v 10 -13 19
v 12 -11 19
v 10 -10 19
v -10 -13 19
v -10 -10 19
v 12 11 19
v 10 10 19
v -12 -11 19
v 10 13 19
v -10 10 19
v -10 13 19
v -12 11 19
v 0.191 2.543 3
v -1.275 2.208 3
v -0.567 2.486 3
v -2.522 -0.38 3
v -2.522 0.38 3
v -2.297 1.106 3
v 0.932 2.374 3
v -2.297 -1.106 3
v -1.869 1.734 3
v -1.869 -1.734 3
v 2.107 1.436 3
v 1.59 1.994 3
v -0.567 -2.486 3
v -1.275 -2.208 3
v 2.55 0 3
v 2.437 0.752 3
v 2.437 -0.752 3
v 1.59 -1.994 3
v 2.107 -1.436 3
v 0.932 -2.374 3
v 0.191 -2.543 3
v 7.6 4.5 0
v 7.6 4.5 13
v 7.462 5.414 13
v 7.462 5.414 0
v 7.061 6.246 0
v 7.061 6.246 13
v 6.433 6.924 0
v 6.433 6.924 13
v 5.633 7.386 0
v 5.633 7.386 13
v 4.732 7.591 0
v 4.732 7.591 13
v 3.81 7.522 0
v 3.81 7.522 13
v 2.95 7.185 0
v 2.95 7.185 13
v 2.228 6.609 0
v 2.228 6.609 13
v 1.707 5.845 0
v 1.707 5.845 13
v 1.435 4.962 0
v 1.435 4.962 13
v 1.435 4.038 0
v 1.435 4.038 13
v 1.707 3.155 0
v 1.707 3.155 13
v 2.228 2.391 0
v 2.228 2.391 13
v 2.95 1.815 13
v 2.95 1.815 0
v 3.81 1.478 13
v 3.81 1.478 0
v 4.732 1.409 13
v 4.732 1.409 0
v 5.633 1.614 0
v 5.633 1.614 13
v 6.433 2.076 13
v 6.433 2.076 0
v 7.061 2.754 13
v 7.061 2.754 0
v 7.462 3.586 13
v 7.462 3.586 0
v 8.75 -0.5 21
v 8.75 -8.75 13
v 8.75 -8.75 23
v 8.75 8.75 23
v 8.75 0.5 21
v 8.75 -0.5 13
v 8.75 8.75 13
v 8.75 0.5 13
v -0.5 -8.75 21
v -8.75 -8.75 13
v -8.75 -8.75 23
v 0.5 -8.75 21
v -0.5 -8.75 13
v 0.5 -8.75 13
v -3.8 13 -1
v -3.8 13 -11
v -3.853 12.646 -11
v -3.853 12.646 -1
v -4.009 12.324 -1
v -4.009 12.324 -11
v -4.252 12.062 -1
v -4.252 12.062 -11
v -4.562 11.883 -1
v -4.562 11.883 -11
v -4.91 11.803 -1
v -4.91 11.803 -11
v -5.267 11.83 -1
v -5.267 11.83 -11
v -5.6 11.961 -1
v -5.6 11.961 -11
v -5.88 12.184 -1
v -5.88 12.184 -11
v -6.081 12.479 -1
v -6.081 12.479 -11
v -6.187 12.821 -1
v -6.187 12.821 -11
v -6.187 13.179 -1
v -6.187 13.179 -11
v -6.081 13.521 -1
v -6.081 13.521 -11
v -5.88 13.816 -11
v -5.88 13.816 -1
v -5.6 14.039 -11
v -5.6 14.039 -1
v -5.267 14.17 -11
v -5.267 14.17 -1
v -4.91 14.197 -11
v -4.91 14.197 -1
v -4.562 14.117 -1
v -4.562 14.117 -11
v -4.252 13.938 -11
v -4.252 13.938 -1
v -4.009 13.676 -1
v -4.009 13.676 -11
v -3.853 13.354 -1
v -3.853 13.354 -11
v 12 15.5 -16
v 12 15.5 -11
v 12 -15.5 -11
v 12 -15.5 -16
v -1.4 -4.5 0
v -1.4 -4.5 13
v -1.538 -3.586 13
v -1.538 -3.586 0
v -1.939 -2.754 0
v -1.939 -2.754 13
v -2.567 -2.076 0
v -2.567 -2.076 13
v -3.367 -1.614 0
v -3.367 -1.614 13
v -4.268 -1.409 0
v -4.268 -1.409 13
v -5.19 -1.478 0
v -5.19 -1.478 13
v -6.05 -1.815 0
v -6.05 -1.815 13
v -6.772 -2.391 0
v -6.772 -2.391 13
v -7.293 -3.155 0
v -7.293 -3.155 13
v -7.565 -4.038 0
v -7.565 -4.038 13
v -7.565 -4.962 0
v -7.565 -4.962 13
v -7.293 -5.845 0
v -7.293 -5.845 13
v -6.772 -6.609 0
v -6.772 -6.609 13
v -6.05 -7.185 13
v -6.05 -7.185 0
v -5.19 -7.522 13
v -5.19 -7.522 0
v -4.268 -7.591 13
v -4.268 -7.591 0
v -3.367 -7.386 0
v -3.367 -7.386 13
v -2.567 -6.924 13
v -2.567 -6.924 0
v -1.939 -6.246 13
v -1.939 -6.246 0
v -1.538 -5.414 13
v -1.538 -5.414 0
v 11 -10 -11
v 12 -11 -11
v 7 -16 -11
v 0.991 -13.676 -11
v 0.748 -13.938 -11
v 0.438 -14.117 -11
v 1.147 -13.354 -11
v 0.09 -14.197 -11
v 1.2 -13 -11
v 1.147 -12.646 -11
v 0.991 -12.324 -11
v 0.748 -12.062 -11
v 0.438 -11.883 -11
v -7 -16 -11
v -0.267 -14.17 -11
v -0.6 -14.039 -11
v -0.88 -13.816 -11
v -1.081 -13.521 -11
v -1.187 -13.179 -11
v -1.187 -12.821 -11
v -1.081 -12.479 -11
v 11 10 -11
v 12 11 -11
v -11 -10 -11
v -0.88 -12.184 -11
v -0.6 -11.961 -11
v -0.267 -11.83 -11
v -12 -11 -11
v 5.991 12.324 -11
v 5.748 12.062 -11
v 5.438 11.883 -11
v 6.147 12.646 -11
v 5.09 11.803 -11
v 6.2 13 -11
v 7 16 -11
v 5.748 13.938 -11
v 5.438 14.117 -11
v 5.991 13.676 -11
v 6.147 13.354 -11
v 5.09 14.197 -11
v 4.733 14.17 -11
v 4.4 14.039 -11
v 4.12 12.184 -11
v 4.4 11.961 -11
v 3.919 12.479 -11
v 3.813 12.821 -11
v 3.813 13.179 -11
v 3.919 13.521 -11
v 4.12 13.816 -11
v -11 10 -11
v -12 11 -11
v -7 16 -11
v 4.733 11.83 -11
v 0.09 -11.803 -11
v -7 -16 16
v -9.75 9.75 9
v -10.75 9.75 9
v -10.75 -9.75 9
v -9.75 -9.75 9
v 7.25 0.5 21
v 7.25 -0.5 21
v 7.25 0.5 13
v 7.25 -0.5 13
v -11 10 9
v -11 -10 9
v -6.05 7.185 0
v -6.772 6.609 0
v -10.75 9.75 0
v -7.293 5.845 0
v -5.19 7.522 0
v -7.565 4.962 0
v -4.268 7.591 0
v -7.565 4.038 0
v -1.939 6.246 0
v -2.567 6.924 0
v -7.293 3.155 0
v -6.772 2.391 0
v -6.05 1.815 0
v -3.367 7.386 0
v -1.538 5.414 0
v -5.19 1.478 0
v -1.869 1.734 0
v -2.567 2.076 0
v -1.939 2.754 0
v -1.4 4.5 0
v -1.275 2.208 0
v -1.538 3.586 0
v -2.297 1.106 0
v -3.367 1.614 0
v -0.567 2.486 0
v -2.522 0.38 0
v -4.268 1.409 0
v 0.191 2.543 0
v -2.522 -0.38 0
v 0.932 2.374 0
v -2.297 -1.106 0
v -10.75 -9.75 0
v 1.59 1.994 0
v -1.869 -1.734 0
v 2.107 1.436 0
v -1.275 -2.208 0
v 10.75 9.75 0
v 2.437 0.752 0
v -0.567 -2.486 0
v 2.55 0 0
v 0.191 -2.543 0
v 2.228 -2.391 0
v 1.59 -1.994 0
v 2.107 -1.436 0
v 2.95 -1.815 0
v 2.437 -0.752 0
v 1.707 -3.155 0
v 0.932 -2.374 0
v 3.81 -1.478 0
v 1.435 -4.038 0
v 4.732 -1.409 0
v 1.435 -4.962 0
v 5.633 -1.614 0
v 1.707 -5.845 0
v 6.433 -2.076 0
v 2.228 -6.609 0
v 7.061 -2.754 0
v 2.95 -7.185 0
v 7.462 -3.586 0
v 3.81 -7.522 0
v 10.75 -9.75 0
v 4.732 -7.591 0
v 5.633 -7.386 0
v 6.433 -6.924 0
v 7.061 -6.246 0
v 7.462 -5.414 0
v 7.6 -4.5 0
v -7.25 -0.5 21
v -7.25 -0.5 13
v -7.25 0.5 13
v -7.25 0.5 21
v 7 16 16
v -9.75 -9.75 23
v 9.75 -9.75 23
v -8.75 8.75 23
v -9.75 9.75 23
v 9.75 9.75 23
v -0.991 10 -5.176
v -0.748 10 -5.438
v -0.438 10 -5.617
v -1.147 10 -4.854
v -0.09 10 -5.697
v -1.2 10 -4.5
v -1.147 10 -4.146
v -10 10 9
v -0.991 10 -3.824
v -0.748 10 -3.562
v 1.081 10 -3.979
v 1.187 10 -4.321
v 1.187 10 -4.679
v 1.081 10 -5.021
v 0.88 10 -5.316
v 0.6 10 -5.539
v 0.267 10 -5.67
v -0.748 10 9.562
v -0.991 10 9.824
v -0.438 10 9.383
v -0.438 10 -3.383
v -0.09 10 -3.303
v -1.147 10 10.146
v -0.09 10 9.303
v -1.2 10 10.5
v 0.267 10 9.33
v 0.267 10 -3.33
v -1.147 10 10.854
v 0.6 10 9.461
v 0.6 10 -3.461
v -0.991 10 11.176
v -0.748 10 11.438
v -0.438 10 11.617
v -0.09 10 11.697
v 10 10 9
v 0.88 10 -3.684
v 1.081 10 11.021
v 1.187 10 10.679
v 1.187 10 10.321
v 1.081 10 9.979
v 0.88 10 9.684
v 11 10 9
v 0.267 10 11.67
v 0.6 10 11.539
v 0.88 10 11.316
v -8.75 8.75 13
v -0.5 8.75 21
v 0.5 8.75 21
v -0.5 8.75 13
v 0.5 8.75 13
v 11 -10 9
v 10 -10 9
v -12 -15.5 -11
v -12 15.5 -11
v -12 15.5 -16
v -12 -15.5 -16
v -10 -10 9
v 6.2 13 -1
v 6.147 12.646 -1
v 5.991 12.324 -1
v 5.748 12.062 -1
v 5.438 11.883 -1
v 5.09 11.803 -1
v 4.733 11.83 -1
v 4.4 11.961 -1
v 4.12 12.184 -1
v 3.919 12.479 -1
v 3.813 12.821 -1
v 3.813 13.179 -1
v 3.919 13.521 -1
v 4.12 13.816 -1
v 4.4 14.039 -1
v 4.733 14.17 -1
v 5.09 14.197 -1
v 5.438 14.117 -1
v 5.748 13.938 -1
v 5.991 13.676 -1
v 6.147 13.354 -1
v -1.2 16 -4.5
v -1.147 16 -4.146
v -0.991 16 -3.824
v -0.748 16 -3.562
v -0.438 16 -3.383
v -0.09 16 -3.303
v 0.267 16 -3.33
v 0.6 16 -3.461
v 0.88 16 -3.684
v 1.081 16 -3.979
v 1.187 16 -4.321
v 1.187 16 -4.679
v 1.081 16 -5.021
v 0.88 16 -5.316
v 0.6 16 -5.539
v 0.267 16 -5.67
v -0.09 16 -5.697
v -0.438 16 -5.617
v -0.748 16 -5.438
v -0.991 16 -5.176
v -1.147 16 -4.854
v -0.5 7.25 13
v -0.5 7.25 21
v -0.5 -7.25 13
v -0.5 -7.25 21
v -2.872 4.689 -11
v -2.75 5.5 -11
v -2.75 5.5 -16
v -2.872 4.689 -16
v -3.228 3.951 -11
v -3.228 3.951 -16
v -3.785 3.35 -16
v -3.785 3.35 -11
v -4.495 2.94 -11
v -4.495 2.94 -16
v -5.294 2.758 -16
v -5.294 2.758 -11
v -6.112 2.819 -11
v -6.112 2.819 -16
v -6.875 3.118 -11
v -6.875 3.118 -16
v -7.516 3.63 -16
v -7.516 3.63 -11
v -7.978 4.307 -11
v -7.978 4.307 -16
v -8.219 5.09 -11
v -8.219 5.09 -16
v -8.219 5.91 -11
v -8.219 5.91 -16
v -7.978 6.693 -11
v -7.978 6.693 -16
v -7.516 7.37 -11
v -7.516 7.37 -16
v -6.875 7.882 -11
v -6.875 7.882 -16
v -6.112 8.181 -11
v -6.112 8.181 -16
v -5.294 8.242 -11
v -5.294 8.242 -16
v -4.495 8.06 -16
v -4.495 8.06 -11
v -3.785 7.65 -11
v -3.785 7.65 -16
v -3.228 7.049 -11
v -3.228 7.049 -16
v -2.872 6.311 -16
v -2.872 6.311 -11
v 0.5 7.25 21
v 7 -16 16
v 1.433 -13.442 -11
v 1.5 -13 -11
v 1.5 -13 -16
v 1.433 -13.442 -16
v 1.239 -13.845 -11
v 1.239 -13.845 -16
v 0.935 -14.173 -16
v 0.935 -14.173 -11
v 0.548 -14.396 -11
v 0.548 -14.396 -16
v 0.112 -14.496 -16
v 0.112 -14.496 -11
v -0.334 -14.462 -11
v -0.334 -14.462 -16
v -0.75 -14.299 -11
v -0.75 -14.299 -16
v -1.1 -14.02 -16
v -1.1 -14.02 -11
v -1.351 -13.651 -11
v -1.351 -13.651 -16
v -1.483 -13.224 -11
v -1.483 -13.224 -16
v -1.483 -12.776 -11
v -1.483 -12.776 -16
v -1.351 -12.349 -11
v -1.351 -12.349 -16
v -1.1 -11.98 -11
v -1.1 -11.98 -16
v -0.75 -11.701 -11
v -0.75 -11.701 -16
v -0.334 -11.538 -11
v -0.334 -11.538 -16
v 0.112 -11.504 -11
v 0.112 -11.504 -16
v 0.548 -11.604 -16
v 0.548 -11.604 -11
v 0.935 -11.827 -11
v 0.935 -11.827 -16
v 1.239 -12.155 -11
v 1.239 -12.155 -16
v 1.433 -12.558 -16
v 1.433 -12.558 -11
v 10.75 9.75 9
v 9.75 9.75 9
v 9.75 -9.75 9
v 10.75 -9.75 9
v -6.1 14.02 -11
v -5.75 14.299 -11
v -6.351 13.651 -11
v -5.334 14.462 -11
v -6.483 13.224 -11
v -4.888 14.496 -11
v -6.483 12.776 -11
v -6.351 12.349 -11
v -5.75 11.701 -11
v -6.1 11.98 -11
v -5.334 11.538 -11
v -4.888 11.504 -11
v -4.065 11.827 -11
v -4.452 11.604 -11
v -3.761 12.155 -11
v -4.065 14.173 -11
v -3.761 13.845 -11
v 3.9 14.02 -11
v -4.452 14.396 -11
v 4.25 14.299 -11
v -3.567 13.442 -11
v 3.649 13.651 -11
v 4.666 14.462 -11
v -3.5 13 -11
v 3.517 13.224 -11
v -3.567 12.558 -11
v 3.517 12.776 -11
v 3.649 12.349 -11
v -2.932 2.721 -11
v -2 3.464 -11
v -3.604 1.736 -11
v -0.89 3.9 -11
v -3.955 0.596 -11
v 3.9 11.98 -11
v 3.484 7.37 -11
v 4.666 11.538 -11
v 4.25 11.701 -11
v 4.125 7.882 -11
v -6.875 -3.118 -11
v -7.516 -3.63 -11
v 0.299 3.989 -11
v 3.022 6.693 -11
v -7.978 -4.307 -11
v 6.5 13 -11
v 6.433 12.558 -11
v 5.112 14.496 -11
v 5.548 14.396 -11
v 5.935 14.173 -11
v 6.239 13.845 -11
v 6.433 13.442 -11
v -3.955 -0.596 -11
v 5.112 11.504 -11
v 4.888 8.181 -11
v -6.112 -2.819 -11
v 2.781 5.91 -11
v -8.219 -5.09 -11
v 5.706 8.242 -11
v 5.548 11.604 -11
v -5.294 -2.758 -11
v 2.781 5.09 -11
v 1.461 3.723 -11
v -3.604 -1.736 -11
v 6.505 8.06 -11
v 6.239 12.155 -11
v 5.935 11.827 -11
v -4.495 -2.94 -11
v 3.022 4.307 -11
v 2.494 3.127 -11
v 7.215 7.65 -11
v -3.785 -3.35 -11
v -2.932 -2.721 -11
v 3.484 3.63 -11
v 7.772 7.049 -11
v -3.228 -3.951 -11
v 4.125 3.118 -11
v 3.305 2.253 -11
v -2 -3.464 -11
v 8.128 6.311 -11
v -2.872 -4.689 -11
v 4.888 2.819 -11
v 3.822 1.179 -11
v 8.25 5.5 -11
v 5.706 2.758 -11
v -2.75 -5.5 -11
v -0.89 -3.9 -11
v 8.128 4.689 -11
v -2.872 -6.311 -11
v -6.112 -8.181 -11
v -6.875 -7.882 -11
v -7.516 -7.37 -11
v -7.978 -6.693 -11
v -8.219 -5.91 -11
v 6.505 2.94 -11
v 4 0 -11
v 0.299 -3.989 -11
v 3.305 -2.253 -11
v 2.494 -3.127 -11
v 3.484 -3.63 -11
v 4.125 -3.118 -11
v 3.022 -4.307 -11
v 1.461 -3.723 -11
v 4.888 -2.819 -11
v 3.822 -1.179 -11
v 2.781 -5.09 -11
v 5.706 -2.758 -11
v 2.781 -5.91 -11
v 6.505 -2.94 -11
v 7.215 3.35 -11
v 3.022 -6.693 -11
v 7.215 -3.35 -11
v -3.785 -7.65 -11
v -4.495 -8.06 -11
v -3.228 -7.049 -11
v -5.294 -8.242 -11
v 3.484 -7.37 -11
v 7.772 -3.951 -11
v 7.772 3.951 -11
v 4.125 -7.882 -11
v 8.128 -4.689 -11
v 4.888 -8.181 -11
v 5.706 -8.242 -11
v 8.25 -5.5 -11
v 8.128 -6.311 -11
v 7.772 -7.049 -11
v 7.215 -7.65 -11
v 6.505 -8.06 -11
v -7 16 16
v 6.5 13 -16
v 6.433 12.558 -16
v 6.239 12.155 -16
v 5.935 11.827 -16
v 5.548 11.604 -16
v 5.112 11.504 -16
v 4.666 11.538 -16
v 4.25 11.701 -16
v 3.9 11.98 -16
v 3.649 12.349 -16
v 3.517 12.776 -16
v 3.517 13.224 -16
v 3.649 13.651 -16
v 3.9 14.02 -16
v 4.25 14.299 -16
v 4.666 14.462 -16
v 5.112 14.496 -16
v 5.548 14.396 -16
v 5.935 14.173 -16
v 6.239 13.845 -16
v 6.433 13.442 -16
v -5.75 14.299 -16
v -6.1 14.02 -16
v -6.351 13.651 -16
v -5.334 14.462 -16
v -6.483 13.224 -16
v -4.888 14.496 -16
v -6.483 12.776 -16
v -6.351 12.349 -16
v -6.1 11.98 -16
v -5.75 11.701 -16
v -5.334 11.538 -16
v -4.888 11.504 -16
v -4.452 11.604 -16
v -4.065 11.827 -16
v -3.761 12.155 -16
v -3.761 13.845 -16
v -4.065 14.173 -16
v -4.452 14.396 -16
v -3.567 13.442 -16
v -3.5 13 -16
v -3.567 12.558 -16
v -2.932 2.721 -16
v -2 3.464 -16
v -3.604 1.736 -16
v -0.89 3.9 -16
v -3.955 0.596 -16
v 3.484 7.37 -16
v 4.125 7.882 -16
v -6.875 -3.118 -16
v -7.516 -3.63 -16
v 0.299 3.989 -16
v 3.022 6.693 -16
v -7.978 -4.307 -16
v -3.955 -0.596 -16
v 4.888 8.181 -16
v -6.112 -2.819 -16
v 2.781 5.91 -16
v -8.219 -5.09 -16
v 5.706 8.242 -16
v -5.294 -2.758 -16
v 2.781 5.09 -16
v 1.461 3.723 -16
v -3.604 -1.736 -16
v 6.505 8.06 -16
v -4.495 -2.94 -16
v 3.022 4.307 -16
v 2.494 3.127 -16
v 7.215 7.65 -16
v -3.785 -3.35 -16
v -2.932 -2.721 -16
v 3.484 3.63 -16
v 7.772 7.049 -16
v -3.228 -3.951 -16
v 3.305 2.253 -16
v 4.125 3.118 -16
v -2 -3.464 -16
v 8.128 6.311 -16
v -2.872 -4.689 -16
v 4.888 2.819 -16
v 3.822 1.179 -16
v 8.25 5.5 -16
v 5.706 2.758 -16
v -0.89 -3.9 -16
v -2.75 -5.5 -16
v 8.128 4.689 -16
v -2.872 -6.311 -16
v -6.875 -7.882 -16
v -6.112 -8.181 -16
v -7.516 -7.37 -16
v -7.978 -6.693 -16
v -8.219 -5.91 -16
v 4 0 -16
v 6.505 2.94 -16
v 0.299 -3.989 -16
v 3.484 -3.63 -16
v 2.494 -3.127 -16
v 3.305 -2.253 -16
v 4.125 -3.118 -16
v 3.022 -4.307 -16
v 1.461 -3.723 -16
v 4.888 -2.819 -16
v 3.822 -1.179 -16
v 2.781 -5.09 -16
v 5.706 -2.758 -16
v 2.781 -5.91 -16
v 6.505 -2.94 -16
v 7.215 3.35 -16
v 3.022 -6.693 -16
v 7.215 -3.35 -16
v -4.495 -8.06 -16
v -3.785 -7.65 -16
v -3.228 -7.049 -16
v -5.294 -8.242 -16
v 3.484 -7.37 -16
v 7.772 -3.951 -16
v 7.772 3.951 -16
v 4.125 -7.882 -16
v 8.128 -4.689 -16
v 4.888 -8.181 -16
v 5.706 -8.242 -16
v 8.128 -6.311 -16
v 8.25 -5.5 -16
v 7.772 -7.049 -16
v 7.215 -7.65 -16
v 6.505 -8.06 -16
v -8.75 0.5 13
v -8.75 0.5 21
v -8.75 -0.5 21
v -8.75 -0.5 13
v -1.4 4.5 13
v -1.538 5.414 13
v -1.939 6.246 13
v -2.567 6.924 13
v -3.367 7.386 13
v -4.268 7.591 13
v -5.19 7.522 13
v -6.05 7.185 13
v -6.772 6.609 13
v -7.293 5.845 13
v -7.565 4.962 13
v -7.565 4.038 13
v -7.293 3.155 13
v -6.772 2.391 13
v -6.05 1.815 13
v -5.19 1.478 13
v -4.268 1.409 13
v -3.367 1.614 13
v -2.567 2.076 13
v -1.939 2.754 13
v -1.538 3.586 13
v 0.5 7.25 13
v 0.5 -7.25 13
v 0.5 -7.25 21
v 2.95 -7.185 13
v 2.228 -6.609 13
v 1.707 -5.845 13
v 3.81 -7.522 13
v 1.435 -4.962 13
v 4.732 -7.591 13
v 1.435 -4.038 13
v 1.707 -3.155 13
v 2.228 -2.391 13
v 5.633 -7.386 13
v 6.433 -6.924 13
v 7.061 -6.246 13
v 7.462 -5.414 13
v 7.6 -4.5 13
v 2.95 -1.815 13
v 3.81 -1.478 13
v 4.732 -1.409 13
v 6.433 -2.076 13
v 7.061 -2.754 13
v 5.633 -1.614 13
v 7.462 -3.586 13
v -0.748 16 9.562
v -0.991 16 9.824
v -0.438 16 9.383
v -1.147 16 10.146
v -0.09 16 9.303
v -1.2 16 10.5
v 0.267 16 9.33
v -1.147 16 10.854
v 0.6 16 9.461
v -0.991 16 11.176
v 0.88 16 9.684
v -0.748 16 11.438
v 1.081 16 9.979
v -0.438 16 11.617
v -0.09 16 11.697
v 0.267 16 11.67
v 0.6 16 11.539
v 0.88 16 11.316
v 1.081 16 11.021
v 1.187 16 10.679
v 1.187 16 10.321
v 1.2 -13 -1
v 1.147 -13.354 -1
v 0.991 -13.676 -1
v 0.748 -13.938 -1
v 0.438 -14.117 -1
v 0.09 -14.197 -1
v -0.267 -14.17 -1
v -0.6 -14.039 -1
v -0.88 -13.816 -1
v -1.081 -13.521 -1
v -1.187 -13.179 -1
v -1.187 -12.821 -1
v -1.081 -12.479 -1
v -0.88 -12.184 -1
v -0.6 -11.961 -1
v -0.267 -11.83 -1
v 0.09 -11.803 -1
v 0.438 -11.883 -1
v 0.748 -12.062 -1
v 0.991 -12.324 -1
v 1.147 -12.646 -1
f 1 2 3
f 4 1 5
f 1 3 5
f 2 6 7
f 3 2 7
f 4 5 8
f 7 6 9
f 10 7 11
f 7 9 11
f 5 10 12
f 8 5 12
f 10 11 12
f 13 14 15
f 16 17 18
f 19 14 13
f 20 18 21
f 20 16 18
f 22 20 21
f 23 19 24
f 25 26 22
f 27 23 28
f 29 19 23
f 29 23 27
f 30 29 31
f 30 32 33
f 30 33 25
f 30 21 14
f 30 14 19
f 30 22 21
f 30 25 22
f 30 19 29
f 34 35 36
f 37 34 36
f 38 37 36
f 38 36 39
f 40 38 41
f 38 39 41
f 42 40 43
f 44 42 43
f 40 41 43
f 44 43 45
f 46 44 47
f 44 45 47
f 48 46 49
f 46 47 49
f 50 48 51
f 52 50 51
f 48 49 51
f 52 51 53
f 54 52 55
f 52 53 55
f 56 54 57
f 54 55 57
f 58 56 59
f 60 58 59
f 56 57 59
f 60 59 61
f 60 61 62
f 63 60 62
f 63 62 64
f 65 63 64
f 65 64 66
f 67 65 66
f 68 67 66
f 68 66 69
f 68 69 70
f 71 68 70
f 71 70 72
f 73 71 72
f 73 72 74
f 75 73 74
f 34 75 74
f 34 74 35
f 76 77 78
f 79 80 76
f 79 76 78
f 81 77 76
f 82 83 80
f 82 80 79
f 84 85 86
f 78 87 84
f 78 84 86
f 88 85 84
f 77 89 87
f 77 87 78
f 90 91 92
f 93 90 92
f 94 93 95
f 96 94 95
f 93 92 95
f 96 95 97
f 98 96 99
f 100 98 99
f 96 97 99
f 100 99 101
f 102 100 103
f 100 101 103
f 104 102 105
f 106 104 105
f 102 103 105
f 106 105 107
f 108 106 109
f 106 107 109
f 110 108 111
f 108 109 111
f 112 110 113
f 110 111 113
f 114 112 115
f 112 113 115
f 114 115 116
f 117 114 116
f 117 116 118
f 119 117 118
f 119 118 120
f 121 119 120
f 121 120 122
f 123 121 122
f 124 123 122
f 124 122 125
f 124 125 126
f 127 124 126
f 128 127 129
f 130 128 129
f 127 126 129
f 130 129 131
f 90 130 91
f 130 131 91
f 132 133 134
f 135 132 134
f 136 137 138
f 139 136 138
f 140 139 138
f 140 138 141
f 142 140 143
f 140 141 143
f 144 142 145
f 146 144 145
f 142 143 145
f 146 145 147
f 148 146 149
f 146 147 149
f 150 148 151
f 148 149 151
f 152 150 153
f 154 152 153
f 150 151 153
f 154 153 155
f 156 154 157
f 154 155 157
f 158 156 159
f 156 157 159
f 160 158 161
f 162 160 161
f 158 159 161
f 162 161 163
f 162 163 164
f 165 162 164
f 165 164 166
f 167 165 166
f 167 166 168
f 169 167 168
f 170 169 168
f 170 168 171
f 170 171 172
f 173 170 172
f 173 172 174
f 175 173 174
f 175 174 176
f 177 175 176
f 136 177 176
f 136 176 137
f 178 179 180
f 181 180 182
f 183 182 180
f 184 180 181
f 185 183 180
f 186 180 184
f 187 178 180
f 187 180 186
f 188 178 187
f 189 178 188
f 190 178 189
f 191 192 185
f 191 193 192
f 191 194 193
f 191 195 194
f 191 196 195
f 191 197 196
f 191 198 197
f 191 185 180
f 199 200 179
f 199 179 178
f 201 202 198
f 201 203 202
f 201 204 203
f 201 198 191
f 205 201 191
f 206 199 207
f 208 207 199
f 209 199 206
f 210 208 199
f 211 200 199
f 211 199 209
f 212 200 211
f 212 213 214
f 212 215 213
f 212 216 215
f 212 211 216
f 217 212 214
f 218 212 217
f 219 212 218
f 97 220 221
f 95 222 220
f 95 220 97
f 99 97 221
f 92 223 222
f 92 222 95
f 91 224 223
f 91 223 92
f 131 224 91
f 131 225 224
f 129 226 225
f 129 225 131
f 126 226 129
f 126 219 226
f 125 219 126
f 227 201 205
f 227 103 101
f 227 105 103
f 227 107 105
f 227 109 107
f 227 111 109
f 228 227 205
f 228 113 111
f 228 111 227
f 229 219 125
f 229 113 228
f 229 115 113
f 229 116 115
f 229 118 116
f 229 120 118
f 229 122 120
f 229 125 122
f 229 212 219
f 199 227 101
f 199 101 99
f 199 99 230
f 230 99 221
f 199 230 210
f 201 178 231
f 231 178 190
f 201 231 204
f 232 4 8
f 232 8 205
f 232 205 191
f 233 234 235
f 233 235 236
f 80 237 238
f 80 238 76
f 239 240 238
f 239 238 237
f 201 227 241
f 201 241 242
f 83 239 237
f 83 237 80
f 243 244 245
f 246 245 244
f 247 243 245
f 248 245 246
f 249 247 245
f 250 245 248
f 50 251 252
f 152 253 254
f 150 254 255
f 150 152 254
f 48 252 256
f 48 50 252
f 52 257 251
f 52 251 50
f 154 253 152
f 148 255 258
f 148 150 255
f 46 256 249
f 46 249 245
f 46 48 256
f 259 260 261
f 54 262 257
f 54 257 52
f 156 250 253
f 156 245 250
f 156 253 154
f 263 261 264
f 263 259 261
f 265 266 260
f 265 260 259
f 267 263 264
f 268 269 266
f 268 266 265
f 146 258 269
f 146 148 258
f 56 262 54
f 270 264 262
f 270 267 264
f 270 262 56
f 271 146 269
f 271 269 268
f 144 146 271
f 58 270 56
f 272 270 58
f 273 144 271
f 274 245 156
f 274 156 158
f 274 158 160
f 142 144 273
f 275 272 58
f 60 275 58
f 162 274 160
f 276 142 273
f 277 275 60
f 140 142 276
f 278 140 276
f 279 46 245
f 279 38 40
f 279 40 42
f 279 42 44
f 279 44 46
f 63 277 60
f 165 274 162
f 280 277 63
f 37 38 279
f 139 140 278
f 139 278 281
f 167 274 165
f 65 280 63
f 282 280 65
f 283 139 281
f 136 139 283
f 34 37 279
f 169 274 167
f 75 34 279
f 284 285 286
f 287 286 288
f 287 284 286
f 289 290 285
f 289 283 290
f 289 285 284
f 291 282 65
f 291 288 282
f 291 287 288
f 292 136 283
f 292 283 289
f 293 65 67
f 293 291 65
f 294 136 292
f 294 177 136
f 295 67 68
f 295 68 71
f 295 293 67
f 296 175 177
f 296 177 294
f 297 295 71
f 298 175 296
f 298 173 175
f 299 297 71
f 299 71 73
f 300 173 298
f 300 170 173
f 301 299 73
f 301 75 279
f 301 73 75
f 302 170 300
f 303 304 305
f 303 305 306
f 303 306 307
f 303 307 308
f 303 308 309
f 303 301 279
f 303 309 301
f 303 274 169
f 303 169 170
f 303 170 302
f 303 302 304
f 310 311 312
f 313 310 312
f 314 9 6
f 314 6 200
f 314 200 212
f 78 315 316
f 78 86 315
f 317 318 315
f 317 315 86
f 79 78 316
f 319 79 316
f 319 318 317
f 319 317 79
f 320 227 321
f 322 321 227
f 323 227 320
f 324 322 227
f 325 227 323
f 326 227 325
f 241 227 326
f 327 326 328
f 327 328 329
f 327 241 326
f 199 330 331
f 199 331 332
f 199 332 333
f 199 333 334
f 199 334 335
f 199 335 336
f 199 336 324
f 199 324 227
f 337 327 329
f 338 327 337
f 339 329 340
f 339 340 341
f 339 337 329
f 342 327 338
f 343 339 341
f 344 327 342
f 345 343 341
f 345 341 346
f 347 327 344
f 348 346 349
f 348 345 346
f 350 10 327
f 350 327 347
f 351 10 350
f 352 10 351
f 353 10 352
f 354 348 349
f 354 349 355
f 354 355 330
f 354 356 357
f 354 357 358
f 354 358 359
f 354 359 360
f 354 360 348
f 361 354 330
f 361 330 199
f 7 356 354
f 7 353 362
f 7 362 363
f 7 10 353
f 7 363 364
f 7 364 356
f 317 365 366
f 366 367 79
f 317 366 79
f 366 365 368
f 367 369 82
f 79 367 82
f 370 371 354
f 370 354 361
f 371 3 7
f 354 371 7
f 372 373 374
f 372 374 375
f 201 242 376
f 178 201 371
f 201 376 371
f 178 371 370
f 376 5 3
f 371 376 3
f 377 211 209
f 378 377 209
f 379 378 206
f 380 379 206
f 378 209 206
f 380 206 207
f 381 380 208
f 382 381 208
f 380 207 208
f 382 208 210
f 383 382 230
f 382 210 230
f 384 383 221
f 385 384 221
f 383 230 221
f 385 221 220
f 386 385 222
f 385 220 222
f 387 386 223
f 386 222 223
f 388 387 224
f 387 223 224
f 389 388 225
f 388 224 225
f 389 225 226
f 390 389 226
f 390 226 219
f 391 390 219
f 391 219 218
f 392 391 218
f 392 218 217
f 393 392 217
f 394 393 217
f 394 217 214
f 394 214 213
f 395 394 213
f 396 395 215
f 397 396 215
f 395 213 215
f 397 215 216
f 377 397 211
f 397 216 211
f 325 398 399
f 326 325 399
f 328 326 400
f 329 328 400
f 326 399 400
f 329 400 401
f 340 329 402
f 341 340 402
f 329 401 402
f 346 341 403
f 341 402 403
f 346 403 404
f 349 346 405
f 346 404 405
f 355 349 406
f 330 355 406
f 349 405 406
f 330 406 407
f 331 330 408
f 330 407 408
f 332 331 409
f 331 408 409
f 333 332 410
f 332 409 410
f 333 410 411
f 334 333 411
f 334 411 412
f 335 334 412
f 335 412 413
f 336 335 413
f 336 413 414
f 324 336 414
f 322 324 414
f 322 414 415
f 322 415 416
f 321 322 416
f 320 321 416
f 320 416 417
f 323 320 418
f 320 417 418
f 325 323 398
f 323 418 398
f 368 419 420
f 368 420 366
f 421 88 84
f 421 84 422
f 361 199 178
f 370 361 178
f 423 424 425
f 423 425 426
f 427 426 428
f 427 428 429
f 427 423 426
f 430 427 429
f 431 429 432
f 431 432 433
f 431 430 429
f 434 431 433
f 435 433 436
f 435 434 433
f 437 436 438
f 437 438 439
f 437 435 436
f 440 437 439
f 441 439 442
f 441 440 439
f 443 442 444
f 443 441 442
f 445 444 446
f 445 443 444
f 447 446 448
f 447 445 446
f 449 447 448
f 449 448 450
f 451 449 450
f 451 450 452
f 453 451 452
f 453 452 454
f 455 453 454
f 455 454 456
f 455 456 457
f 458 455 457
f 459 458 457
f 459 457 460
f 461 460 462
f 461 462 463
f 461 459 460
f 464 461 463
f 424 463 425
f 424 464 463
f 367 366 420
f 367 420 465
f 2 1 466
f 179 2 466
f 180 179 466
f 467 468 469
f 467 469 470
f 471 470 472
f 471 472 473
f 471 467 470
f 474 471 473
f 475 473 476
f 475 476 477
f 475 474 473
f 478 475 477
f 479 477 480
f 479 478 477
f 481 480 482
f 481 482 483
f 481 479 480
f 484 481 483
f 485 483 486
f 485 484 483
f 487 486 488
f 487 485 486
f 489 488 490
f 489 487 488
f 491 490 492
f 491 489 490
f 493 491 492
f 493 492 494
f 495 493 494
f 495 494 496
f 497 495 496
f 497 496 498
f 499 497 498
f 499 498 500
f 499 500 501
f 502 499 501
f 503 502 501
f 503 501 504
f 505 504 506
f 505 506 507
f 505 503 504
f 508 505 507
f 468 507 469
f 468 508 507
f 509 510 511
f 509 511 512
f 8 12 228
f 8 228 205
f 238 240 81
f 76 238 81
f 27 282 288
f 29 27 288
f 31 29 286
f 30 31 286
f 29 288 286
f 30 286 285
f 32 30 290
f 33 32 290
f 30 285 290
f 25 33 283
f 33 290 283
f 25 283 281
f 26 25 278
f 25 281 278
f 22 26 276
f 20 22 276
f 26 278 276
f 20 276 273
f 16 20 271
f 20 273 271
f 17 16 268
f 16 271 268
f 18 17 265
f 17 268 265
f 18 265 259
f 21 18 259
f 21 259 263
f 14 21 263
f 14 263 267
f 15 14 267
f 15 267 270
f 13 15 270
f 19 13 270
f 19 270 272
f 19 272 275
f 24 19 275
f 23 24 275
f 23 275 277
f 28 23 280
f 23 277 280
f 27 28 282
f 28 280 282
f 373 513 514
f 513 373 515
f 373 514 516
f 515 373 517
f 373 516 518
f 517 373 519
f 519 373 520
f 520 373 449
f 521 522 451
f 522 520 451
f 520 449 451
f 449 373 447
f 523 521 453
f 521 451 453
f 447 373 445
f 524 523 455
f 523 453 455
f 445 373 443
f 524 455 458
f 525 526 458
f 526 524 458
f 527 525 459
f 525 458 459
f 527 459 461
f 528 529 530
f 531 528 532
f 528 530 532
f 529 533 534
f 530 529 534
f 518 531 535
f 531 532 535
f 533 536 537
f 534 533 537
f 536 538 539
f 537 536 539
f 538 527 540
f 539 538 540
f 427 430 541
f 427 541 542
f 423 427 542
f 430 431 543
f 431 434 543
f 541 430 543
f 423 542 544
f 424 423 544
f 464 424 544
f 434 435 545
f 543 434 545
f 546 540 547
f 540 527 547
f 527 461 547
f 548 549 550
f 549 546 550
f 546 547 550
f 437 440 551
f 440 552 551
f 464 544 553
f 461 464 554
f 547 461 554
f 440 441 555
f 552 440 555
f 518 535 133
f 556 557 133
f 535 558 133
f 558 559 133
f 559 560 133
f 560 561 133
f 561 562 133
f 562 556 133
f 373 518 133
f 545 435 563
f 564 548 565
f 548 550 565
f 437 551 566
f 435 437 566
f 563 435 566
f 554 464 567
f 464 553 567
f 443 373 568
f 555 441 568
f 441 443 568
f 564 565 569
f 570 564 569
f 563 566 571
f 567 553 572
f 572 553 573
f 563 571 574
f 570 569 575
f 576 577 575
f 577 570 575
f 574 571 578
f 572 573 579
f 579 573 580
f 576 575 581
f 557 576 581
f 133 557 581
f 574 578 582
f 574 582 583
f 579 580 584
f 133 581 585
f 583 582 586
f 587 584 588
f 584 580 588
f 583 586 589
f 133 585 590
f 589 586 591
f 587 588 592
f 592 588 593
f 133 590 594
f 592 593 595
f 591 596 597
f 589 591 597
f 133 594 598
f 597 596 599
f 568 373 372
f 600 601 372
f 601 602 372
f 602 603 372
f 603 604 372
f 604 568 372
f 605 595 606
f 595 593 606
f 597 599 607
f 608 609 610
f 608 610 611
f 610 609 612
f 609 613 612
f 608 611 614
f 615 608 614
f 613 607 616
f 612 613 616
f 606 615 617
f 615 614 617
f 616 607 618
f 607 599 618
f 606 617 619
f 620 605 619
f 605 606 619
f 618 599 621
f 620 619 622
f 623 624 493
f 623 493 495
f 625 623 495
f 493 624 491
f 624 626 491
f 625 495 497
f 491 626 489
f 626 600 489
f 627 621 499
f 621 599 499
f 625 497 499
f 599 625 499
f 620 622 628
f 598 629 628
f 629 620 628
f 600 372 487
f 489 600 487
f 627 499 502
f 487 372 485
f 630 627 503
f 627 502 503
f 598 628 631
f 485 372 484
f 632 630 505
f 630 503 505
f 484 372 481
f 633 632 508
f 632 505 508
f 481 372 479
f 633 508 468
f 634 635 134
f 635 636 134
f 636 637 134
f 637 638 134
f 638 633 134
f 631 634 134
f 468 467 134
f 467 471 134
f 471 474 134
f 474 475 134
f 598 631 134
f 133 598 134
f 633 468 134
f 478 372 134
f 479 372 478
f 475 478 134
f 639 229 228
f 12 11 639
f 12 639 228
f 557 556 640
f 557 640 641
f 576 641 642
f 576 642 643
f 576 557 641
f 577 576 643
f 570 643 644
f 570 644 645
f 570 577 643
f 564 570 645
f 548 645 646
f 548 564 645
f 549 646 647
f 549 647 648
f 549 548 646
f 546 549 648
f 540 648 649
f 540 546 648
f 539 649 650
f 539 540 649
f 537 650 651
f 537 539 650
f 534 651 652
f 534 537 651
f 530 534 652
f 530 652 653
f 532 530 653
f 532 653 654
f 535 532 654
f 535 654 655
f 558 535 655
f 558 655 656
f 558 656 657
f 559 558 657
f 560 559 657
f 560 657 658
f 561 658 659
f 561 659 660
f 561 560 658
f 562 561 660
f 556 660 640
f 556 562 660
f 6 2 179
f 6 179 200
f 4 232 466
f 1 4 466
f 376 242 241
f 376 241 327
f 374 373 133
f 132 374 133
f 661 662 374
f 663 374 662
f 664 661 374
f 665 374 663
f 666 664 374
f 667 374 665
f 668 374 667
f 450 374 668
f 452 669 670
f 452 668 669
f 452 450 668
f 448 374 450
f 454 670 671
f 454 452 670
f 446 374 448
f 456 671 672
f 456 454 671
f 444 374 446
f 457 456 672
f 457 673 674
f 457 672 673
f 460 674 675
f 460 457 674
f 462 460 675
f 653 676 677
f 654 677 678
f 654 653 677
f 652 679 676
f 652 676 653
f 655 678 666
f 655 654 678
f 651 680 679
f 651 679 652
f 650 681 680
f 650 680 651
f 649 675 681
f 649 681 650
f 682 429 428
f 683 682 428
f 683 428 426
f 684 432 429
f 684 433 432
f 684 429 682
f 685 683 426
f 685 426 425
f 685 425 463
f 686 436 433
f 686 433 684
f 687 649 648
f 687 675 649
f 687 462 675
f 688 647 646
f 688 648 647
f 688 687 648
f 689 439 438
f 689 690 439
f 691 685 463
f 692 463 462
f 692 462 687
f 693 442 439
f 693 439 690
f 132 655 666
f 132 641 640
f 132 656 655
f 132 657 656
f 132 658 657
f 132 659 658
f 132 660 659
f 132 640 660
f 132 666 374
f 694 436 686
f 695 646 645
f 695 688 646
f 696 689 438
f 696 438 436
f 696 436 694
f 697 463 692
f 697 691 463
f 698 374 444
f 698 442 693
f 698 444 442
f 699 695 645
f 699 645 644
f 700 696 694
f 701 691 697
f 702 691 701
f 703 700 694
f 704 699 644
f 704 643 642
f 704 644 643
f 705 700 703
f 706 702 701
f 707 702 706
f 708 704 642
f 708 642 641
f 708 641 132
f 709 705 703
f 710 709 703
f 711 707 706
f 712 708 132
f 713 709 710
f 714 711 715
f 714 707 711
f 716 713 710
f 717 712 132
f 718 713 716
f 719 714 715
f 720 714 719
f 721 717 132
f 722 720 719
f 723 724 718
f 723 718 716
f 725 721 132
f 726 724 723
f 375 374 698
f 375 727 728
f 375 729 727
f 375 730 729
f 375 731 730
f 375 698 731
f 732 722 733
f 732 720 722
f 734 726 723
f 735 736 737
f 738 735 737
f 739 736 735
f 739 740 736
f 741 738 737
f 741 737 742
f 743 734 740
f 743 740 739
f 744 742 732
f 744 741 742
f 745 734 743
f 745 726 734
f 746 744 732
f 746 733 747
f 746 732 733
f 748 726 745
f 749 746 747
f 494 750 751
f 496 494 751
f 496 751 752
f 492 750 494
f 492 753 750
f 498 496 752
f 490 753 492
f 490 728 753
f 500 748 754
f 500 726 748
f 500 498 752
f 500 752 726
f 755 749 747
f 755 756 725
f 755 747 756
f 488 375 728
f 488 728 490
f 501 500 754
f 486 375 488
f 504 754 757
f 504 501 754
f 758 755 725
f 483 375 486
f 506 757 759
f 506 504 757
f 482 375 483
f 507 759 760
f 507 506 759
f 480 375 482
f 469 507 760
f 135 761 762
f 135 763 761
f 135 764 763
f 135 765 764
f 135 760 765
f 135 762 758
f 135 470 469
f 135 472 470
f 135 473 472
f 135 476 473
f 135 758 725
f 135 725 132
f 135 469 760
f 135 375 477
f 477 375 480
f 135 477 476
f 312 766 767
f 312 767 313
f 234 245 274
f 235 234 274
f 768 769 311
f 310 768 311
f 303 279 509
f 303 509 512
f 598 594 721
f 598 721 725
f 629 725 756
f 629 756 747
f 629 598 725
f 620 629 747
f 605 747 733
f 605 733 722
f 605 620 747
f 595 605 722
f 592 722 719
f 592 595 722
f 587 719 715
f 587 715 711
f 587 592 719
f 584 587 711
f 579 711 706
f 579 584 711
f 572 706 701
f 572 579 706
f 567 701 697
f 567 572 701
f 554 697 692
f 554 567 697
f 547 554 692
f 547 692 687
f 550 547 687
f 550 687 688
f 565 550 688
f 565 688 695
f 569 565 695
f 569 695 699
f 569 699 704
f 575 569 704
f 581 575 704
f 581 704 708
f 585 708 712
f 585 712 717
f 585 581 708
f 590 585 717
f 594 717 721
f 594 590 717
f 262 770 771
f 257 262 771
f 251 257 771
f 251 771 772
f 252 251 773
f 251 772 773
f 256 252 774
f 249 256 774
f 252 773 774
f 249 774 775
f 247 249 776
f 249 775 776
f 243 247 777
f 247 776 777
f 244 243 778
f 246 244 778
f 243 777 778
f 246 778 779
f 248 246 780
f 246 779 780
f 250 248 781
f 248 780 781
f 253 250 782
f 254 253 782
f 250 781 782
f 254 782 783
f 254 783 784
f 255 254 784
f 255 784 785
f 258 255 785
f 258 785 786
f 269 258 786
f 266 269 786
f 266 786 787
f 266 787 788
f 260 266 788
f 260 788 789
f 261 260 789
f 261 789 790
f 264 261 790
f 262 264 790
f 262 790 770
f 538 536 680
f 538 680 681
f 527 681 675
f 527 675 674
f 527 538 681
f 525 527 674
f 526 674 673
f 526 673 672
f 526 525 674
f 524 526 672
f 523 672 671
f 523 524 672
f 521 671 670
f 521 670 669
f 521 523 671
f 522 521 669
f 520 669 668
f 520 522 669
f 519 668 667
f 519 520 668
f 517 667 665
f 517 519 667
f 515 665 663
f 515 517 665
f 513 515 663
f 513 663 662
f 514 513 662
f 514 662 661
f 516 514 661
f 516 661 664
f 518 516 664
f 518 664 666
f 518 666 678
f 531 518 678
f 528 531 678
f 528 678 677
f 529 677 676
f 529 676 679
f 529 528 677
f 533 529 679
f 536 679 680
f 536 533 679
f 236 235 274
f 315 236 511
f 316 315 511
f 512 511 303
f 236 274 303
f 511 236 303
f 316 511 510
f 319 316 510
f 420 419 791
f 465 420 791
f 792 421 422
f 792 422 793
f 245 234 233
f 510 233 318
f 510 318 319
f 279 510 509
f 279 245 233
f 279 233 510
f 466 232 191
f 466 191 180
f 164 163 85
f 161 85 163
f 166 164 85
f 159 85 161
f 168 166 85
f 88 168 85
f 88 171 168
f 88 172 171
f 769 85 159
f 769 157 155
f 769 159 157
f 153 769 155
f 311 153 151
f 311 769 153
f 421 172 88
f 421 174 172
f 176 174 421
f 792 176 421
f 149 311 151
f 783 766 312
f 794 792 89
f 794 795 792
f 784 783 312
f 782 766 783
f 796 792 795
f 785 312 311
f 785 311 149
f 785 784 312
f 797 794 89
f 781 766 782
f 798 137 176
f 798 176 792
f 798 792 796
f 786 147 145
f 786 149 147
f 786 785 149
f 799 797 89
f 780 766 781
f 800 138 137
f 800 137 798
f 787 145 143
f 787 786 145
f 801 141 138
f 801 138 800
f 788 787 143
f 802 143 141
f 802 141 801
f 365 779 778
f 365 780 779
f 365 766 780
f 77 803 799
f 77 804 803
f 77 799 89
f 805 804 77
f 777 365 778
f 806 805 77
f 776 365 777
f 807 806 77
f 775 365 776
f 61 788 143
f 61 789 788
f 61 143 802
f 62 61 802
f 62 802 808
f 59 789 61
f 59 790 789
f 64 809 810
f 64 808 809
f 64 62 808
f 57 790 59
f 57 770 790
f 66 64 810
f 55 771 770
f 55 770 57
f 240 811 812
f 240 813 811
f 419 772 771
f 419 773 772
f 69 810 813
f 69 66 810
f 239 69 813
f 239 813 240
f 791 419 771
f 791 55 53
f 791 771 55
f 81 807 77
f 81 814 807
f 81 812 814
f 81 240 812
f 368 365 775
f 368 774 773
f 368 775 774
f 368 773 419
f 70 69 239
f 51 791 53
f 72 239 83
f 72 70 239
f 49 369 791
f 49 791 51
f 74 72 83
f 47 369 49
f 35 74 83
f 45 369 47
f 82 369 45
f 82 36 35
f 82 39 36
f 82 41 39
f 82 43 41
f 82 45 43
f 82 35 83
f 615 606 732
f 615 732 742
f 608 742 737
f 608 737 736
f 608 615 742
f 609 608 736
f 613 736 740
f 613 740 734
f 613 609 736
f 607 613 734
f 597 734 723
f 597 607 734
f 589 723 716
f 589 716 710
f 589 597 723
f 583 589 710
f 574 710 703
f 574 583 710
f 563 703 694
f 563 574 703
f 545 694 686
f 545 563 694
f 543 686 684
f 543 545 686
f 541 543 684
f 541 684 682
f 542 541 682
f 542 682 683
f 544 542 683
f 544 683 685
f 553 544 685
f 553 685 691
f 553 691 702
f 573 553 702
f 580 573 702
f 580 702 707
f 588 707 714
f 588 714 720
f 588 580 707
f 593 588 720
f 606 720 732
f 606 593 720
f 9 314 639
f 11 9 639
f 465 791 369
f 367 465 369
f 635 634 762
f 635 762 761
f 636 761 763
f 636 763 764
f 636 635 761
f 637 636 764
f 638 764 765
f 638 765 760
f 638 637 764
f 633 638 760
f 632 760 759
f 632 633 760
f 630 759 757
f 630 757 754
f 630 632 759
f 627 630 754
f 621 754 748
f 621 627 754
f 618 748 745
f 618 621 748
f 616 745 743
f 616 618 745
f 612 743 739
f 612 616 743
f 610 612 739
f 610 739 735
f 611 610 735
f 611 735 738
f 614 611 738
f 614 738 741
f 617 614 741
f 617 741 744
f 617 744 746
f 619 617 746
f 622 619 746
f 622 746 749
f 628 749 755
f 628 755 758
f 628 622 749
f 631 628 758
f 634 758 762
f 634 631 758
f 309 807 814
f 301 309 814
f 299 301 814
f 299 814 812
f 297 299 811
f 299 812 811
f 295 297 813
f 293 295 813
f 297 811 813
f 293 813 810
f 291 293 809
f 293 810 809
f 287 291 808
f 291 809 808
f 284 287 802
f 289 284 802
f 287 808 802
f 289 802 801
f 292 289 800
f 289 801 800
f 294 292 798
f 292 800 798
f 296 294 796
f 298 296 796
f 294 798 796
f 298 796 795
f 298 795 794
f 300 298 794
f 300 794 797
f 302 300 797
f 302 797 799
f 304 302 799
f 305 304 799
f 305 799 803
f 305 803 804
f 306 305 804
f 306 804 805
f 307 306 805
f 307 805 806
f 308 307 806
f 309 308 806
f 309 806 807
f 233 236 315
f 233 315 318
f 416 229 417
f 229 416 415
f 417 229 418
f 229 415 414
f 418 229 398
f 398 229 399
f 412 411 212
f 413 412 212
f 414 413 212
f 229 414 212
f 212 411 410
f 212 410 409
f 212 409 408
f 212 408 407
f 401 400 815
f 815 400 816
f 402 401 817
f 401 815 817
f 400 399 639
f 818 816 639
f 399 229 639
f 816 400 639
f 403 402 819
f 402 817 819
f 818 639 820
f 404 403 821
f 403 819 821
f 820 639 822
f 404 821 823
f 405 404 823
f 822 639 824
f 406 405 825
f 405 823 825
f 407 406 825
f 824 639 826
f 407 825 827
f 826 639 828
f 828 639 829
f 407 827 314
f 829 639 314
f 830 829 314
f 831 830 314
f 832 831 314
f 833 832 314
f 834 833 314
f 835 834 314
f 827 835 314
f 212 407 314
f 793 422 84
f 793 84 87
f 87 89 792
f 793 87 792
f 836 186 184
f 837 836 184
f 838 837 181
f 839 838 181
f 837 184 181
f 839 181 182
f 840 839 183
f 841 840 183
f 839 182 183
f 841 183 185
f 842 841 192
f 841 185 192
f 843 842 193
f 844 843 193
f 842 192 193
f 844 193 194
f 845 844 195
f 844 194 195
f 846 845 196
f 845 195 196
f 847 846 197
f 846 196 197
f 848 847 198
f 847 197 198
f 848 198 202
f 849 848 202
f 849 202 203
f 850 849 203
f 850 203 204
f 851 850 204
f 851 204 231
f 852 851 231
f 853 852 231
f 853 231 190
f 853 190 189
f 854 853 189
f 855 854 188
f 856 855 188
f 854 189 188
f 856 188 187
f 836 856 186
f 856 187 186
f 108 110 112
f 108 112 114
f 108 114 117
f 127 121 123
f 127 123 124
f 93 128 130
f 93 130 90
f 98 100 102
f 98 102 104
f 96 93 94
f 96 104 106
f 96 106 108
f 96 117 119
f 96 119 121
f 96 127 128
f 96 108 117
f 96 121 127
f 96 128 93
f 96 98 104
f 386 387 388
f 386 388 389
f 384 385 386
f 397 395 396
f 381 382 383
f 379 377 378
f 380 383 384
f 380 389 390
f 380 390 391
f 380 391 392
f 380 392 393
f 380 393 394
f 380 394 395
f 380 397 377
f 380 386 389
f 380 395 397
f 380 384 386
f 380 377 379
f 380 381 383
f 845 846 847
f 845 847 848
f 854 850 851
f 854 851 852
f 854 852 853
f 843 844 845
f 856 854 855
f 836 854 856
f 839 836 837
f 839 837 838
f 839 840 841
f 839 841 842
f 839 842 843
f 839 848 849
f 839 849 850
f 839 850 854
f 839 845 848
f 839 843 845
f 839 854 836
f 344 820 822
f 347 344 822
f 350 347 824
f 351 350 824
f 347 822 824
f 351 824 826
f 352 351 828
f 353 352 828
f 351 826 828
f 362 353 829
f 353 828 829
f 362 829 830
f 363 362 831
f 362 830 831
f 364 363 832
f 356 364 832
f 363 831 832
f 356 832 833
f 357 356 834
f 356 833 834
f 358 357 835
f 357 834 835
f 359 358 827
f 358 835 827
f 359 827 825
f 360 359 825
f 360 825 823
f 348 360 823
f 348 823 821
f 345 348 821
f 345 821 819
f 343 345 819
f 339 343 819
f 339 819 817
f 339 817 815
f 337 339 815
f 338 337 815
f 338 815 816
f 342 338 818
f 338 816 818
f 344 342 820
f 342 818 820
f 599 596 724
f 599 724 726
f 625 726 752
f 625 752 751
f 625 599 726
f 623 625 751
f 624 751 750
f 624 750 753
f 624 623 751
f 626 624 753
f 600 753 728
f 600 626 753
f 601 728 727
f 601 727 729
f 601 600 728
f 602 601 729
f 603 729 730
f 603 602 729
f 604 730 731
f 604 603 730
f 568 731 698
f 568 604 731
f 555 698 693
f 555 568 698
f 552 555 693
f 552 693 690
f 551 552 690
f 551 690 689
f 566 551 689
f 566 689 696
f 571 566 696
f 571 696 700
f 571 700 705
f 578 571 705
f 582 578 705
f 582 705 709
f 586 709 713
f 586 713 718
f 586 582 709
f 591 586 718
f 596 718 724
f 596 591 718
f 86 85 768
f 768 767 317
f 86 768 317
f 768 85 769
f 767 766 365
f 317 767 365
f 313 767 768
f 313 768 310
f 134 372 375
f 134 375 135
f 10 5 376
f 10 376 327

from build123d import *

# Parameters (mm, degrees)
F0_W          = 19.5
F0_H          = 19.5
F1_DEPTH      = 13
F2_W          = 19.5
F2_H          = 19.5
F2_W_2        = 17.5
F2_H_2        = 17.5
F3_DEPTH      = 10
F4_W          = 1
F4_H          = 1.5
F4_W_2        = 1.5
F4_H_2        = 1
F5_DEPTH      = 8
F6_R          = 3.1
F7_DEPTH      = 19
F8_W          = 1
F8_H          = 19.5
F9_DEPTH      = 9
F10_R         = 2.55
F11_DEPTH     = 3
F13_W         = 20
F13_H         = 20
F13_W_2       = 10
F13_H_2       = 5
F14_DEPTH     = 30
F15_W         = 22
F15_H         = 20
F16_DEPTH     = 20
F17_R         = 1.2
F18_DEPTH     = 6
F19_T4_DEPTH  = 30
F19_T10_DEPTH = 30
F19_T16_DEPTH = 30
F19_T22_DEPTH = 30
F20_R         = 1.2
F21_DEPTH     = 10
F23_W         = 24
F23_H         = 31
F23_R         = 1.5
F23_R_2       = 2.75
F23_R_3       = 4
F24_DEPTH     = 5
F25_SIZE      = 3


# Not quite as in the source:
# - a fillet or chamfer that OpenCascade refuses, or shapes differently, is made with other operations: its cross-section is extruded or revolved along the edge and cut away or added


with BuildPart() as f1:
    # F0 (on Top) → F1 (new body)
    with BuildSketch(Plane.XY):
        Rectangle(F0_W, F0_H)
    extrude(amount=F1_DEPTH)

    # F2 (on face) → F3 (join)
    with BuildSketch(Plane.XY.offset(13)):
        Rectangle(F2_W, F2_H)
        Rectangle(F2_W_2, F2_H_2, mode=Mode.SUBTRACT)
    extrude(amount=F3_DEPTH)

    # F4 (on face) → F5 (join)
    with BuildSketch(Plane.XY.offset(13)):
        with Locations((0, 8)):
            Rectangle(F4_W, F4_H)
        with Locations((0, -8)):
            Rectangle(F4_W, F4_H)
        with Locations((-8, 0)):
            Rectangle(F4_W_2, F4_H_2)
        with Locations((8, 0)):
            Rectangle(F4_W_2, F4_H_2)
    extrude(amount=F5_DEPTH)

    # F6 (on face) → F7 (cut)
    with BuildSketch(Plane.XY.offset(13)):
        with Locations((-4.5, 4.5)):
            Circle(F6_R)
        with Locations((-4.5, -4.5)):
            Circle(F6_R)
        with Locations((4.5, 4.5)):
            Circle(F6_R)
        with Locations((4.5, -4.5)):
            Circle(F6_R)
    extrude(amount=-F7_DEPTH, mode=Mode.SUBTRACT)

    # F8 (on face) → F9 (join)
    with BuildSketch(Plane(origin=(0, 0, 0), x_dir=(1, 0, 0), z_dir=(0, 0, -1))):
        with Locations((-10.25, 0)):
            Rectangle(F8_W, F8_H)
        with Locations((10.25, 0)):
            Rectangle(F8_W, F8_H)
    extrude(amount=-F9_DEPTH)

    # F10 (on face) → F11 (cut)
    with BuildSketch(Plane(origin=(0, 0, 0), x_dir=(1, 0, 0), z_dir=(0, 0, -1))):
        Circle(F10_R)
    extrude(amount=-F11_DEPTH, mode=Mode.SUBTRACT)


with BuildPart() as f14:
    # F13 (on offset) → F14 (new body)
    with BuildSketch(Plane.XY.offset(19)):
        Polygon((5, -11), (12, -11), (12, 11), (5, 11), (-5, 11), (-12, 11), (-12, -11), (-5, -11), align=None)
        Rectangle(F13_W, F13_H, mode=Mode.SUBTRACT)
        with Locations((0, -13.5)):
            Rectangle(F13_W_2, F13_H_2)
        with Locations((0, 13.5)):
            Rectangle(F13_W_2, F13_H_2)
    extrude(amount=-F14_DEPTH)

    # F15 (on face) → F16 (cut)
    with BuildSketch(Plane(origin=(0, 0, -11), x_dir=(1, 0, 0), z_dir=(0, 0, -1))):
        Rectangle(F15_W, F15_H)
    extrude(amount=-F16_DEPTH, mode=Mode.SUBTRACT)

    # F17 (on face) → F18 (cut)
    with BuildSketch(Plane(origin=(0, 16, 0), x_dir=(-1, 0, 0), z_dir=(0, 1, 0))):
        with Locations((0, 10.5)):
            Circle(F17_R)
        with Locations((0, -4.5)):
            Circle(F17_R)
    extrude(amount=-F18_DEPTH, mode=Mode.SUBTRACT)

    # F19: chamfer of 7 on 4 edges, made by hand


with BuildPart() as f19_tool2:
    # F19_s3 → F19_t4 (new body)
    with BuildSketch(Plane.XY.offset(19)):
        Polygon((12, 11), (5, 18), (5, 11), align=None)
    extrude(amount=-F19_T4_DEPTH)

    split(bisect_by=Plane.YZ.offset(12), keep=Keep.BOTTOM)

    split(bisect_by=Plane.XZ.offset(-16), keep=Keep.TOP)


with BuildPart() as f14_1:
    add(f14.part)

    # F19_t1: union F19_tool2
    add(f19_tool2.part)


with BuildPart() as f19_tool8:
    # F19_s9 → F19_t10 (new body)
    with BuildSketch(Plane.XY.offset(19)):
        Polygon((-5, 18), (-12, 11), (-5, 11), align=None)
    extrude(amount=-F19_T10_DEPTH)

    split(bisect_by=Plane.XZ.offset(-16), keep=Keep.TOP)

    split(bisect_by=Plane.YZ.offset(-12), keep=Keep.TOP)


with BuildPart() as f14_2:
    add(f14_1.part)

    # F19_t7: union F19_tool8
    add(f19_tool8.part)


with BuildPart() as f19_tool14:
    # F19_s15 → F19_t16 (new body)
    with BuildSketch(Plane.XY.offset(19)):
        Polygon((-12, -11), (-5, -18), (-5, -11), align=None)
    extrude(amount=-F19_T16_DEPTH)

    split(bisect_by=Plane.XZ.offset(16), keep=Keep.BOTTOM)

    split(bisect_by=Plane.YZ.offset(-12), keep=Keep.TOP)


with BuildPart() as f14_3:
    add(f14_2.part)

    # F19_t13: union F19_tool14
    add(f19_tool14.part)


with BuildPart() as f19_tool20:
    # F19_s21 → F19_t22 (new body)
    with BuildSketch(Plane.XY.offset(19)):
        Polygon((12, -11), (5, -18), (5, -11), align=None)
    extrude(amount=-F19_T22_DEPTH)

    split(bisect_by=Plane.YZ.offset(12), keep=Keep.BOTTOM)

    split(bisect_by=Plane.XZ.offset(16), keep=Keep.BOTTOM)


with BuildPart() as f14_4:
    add(f14_3.part)

    # F19_t19: union F19_tool20
    add(f19_tool20.part)

    # F20 (on face) → F21 (cut)
    with BuildSketch(Plane(origin=(0, 0, -11), x_dir=(1, 0, 0), z_dir=(0, 0, -1))):
        with Locations((0, 13)):
            Circle(F20_R)
        with Locations((-5, -13)):
            Circle(F20_R)
        with Locations((5, -13)):
            Circle(F20_R)
    extrude(amount=-F21_DEPTH, mode=Mode.SUBTRACT)

    # F25
    f25_edges = [f14_4.edges().sort_by_distance(p)[0] for p in [
        (0, 16, 19),
        (0, -16, 19),
    ]]
    chamfer(f25_edges, length=F25_SIZE)


with BuildPart() as f24:
    # F23 (on offset) → F24 (new body)
    with BuildSketch(Plane(origin=(0, 0, -11), x_dir=(1, 0, 0), z_dir=(0, 0, -1))):
        Rectangle(F23_W, F23_H)
        with Locations((-5, -13)):
            Circle(F23_R, mode=Mode.SUBTRACT)
        with Locations((-5.5, -5.5)):
            Circle(F23_R_2, mode=Mode.SUBTRACT)
        with Locations((5, -13)):
            Circle(F23_R, mode=Mode.SUBTRACT)
        with Locations((5.5, -5.5)):
            Circle(F23_R_2, mode=Mode.SUBTRACT)
        with Locations((-5.5, 5.5)):
            Circle(F23_R_2, mode=Mode.SUBTRACT)
        Circle(F23_R_3, mode=Mode.SUBTRACT)
        with Locations((5.5, 5.5)):
            Circle(F23_R_2, mode=Mode.SUBTRACT)
        with Locations((0, 13)):
            Circle(F23_R, mode=Mode.SUBTRACT)
    extrude(amount=F24_DEPTH)


solid = Compound([f1.part, f14_4.part, f24.part])
